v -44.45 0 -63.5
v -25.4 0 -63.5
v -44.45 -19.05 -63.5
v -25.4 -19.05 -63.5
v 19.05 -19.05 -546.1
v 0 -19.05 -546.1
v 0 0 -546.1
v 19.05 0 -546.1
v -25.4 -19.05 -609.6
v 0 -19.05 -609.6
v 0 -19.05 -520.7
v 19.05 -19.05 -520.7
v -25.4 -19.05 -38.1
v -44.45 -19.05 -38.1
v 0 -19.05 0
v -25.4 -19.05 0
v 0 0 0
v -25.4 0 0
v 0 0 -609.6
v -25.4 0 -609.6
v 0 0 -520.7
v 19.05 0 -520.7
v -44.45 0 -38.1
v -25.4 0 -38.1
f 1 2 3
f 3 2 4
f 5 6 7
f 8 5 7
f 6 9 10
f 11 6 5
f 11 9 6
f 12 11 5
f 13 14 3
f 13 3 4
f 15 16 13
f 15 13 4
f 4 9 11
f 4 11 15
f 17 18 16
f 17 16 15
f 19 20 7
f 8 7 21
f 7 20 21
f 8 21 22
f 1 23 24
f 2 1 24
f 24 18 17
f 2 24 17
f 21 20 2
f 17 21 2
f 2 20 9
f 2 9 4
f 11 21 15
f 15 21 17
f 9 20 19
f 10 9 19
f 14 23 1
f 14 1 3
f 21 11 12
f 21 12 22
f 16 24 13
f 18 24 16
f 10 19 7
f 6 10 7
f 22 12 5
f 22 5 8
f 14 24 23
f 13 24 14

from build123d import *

# Parameters (mm, degrees)
F0_W     = 25.4
F0_H     = 609.6
F1_DEPTH = 19.05
F2_W     = 19.05
F2_H     = 25.4
F3_DEPTH = 19.05
F4_W     = 19.05
F4_H     = 25.4
F5_DEPTH = 19.05


with BuildPart() as f1:
    # F0 (on Front) → F1 (new body)
    with BuildSketch(Plane.XZ):
        with Locations((-12.7, -304.8)):
            Rectangle(F0_W, F0_H)
    extrude(amount=F1_DEPTH)

    # F2 (on face) → F3 (join)
    with BuildSketch(Plane(origin=(-25.4, 0, 0), x_dir=(0, -1, 0), z_dir=(-1, 0, 0))):
        with Locations((9.525, -50.8)):
            Rectangle(F2_W, F2_H)
    extrude(amount=F3_DEPTH)

    # F4 (on face) → F5 (join)
    with BuildSketch(Plane.YZ):
        with Locations((-9.525, -533.4)):
            Rectangle(F4_W, F4_H)
    extrude(amount=F5_DEPTH)


solid = f1.part
